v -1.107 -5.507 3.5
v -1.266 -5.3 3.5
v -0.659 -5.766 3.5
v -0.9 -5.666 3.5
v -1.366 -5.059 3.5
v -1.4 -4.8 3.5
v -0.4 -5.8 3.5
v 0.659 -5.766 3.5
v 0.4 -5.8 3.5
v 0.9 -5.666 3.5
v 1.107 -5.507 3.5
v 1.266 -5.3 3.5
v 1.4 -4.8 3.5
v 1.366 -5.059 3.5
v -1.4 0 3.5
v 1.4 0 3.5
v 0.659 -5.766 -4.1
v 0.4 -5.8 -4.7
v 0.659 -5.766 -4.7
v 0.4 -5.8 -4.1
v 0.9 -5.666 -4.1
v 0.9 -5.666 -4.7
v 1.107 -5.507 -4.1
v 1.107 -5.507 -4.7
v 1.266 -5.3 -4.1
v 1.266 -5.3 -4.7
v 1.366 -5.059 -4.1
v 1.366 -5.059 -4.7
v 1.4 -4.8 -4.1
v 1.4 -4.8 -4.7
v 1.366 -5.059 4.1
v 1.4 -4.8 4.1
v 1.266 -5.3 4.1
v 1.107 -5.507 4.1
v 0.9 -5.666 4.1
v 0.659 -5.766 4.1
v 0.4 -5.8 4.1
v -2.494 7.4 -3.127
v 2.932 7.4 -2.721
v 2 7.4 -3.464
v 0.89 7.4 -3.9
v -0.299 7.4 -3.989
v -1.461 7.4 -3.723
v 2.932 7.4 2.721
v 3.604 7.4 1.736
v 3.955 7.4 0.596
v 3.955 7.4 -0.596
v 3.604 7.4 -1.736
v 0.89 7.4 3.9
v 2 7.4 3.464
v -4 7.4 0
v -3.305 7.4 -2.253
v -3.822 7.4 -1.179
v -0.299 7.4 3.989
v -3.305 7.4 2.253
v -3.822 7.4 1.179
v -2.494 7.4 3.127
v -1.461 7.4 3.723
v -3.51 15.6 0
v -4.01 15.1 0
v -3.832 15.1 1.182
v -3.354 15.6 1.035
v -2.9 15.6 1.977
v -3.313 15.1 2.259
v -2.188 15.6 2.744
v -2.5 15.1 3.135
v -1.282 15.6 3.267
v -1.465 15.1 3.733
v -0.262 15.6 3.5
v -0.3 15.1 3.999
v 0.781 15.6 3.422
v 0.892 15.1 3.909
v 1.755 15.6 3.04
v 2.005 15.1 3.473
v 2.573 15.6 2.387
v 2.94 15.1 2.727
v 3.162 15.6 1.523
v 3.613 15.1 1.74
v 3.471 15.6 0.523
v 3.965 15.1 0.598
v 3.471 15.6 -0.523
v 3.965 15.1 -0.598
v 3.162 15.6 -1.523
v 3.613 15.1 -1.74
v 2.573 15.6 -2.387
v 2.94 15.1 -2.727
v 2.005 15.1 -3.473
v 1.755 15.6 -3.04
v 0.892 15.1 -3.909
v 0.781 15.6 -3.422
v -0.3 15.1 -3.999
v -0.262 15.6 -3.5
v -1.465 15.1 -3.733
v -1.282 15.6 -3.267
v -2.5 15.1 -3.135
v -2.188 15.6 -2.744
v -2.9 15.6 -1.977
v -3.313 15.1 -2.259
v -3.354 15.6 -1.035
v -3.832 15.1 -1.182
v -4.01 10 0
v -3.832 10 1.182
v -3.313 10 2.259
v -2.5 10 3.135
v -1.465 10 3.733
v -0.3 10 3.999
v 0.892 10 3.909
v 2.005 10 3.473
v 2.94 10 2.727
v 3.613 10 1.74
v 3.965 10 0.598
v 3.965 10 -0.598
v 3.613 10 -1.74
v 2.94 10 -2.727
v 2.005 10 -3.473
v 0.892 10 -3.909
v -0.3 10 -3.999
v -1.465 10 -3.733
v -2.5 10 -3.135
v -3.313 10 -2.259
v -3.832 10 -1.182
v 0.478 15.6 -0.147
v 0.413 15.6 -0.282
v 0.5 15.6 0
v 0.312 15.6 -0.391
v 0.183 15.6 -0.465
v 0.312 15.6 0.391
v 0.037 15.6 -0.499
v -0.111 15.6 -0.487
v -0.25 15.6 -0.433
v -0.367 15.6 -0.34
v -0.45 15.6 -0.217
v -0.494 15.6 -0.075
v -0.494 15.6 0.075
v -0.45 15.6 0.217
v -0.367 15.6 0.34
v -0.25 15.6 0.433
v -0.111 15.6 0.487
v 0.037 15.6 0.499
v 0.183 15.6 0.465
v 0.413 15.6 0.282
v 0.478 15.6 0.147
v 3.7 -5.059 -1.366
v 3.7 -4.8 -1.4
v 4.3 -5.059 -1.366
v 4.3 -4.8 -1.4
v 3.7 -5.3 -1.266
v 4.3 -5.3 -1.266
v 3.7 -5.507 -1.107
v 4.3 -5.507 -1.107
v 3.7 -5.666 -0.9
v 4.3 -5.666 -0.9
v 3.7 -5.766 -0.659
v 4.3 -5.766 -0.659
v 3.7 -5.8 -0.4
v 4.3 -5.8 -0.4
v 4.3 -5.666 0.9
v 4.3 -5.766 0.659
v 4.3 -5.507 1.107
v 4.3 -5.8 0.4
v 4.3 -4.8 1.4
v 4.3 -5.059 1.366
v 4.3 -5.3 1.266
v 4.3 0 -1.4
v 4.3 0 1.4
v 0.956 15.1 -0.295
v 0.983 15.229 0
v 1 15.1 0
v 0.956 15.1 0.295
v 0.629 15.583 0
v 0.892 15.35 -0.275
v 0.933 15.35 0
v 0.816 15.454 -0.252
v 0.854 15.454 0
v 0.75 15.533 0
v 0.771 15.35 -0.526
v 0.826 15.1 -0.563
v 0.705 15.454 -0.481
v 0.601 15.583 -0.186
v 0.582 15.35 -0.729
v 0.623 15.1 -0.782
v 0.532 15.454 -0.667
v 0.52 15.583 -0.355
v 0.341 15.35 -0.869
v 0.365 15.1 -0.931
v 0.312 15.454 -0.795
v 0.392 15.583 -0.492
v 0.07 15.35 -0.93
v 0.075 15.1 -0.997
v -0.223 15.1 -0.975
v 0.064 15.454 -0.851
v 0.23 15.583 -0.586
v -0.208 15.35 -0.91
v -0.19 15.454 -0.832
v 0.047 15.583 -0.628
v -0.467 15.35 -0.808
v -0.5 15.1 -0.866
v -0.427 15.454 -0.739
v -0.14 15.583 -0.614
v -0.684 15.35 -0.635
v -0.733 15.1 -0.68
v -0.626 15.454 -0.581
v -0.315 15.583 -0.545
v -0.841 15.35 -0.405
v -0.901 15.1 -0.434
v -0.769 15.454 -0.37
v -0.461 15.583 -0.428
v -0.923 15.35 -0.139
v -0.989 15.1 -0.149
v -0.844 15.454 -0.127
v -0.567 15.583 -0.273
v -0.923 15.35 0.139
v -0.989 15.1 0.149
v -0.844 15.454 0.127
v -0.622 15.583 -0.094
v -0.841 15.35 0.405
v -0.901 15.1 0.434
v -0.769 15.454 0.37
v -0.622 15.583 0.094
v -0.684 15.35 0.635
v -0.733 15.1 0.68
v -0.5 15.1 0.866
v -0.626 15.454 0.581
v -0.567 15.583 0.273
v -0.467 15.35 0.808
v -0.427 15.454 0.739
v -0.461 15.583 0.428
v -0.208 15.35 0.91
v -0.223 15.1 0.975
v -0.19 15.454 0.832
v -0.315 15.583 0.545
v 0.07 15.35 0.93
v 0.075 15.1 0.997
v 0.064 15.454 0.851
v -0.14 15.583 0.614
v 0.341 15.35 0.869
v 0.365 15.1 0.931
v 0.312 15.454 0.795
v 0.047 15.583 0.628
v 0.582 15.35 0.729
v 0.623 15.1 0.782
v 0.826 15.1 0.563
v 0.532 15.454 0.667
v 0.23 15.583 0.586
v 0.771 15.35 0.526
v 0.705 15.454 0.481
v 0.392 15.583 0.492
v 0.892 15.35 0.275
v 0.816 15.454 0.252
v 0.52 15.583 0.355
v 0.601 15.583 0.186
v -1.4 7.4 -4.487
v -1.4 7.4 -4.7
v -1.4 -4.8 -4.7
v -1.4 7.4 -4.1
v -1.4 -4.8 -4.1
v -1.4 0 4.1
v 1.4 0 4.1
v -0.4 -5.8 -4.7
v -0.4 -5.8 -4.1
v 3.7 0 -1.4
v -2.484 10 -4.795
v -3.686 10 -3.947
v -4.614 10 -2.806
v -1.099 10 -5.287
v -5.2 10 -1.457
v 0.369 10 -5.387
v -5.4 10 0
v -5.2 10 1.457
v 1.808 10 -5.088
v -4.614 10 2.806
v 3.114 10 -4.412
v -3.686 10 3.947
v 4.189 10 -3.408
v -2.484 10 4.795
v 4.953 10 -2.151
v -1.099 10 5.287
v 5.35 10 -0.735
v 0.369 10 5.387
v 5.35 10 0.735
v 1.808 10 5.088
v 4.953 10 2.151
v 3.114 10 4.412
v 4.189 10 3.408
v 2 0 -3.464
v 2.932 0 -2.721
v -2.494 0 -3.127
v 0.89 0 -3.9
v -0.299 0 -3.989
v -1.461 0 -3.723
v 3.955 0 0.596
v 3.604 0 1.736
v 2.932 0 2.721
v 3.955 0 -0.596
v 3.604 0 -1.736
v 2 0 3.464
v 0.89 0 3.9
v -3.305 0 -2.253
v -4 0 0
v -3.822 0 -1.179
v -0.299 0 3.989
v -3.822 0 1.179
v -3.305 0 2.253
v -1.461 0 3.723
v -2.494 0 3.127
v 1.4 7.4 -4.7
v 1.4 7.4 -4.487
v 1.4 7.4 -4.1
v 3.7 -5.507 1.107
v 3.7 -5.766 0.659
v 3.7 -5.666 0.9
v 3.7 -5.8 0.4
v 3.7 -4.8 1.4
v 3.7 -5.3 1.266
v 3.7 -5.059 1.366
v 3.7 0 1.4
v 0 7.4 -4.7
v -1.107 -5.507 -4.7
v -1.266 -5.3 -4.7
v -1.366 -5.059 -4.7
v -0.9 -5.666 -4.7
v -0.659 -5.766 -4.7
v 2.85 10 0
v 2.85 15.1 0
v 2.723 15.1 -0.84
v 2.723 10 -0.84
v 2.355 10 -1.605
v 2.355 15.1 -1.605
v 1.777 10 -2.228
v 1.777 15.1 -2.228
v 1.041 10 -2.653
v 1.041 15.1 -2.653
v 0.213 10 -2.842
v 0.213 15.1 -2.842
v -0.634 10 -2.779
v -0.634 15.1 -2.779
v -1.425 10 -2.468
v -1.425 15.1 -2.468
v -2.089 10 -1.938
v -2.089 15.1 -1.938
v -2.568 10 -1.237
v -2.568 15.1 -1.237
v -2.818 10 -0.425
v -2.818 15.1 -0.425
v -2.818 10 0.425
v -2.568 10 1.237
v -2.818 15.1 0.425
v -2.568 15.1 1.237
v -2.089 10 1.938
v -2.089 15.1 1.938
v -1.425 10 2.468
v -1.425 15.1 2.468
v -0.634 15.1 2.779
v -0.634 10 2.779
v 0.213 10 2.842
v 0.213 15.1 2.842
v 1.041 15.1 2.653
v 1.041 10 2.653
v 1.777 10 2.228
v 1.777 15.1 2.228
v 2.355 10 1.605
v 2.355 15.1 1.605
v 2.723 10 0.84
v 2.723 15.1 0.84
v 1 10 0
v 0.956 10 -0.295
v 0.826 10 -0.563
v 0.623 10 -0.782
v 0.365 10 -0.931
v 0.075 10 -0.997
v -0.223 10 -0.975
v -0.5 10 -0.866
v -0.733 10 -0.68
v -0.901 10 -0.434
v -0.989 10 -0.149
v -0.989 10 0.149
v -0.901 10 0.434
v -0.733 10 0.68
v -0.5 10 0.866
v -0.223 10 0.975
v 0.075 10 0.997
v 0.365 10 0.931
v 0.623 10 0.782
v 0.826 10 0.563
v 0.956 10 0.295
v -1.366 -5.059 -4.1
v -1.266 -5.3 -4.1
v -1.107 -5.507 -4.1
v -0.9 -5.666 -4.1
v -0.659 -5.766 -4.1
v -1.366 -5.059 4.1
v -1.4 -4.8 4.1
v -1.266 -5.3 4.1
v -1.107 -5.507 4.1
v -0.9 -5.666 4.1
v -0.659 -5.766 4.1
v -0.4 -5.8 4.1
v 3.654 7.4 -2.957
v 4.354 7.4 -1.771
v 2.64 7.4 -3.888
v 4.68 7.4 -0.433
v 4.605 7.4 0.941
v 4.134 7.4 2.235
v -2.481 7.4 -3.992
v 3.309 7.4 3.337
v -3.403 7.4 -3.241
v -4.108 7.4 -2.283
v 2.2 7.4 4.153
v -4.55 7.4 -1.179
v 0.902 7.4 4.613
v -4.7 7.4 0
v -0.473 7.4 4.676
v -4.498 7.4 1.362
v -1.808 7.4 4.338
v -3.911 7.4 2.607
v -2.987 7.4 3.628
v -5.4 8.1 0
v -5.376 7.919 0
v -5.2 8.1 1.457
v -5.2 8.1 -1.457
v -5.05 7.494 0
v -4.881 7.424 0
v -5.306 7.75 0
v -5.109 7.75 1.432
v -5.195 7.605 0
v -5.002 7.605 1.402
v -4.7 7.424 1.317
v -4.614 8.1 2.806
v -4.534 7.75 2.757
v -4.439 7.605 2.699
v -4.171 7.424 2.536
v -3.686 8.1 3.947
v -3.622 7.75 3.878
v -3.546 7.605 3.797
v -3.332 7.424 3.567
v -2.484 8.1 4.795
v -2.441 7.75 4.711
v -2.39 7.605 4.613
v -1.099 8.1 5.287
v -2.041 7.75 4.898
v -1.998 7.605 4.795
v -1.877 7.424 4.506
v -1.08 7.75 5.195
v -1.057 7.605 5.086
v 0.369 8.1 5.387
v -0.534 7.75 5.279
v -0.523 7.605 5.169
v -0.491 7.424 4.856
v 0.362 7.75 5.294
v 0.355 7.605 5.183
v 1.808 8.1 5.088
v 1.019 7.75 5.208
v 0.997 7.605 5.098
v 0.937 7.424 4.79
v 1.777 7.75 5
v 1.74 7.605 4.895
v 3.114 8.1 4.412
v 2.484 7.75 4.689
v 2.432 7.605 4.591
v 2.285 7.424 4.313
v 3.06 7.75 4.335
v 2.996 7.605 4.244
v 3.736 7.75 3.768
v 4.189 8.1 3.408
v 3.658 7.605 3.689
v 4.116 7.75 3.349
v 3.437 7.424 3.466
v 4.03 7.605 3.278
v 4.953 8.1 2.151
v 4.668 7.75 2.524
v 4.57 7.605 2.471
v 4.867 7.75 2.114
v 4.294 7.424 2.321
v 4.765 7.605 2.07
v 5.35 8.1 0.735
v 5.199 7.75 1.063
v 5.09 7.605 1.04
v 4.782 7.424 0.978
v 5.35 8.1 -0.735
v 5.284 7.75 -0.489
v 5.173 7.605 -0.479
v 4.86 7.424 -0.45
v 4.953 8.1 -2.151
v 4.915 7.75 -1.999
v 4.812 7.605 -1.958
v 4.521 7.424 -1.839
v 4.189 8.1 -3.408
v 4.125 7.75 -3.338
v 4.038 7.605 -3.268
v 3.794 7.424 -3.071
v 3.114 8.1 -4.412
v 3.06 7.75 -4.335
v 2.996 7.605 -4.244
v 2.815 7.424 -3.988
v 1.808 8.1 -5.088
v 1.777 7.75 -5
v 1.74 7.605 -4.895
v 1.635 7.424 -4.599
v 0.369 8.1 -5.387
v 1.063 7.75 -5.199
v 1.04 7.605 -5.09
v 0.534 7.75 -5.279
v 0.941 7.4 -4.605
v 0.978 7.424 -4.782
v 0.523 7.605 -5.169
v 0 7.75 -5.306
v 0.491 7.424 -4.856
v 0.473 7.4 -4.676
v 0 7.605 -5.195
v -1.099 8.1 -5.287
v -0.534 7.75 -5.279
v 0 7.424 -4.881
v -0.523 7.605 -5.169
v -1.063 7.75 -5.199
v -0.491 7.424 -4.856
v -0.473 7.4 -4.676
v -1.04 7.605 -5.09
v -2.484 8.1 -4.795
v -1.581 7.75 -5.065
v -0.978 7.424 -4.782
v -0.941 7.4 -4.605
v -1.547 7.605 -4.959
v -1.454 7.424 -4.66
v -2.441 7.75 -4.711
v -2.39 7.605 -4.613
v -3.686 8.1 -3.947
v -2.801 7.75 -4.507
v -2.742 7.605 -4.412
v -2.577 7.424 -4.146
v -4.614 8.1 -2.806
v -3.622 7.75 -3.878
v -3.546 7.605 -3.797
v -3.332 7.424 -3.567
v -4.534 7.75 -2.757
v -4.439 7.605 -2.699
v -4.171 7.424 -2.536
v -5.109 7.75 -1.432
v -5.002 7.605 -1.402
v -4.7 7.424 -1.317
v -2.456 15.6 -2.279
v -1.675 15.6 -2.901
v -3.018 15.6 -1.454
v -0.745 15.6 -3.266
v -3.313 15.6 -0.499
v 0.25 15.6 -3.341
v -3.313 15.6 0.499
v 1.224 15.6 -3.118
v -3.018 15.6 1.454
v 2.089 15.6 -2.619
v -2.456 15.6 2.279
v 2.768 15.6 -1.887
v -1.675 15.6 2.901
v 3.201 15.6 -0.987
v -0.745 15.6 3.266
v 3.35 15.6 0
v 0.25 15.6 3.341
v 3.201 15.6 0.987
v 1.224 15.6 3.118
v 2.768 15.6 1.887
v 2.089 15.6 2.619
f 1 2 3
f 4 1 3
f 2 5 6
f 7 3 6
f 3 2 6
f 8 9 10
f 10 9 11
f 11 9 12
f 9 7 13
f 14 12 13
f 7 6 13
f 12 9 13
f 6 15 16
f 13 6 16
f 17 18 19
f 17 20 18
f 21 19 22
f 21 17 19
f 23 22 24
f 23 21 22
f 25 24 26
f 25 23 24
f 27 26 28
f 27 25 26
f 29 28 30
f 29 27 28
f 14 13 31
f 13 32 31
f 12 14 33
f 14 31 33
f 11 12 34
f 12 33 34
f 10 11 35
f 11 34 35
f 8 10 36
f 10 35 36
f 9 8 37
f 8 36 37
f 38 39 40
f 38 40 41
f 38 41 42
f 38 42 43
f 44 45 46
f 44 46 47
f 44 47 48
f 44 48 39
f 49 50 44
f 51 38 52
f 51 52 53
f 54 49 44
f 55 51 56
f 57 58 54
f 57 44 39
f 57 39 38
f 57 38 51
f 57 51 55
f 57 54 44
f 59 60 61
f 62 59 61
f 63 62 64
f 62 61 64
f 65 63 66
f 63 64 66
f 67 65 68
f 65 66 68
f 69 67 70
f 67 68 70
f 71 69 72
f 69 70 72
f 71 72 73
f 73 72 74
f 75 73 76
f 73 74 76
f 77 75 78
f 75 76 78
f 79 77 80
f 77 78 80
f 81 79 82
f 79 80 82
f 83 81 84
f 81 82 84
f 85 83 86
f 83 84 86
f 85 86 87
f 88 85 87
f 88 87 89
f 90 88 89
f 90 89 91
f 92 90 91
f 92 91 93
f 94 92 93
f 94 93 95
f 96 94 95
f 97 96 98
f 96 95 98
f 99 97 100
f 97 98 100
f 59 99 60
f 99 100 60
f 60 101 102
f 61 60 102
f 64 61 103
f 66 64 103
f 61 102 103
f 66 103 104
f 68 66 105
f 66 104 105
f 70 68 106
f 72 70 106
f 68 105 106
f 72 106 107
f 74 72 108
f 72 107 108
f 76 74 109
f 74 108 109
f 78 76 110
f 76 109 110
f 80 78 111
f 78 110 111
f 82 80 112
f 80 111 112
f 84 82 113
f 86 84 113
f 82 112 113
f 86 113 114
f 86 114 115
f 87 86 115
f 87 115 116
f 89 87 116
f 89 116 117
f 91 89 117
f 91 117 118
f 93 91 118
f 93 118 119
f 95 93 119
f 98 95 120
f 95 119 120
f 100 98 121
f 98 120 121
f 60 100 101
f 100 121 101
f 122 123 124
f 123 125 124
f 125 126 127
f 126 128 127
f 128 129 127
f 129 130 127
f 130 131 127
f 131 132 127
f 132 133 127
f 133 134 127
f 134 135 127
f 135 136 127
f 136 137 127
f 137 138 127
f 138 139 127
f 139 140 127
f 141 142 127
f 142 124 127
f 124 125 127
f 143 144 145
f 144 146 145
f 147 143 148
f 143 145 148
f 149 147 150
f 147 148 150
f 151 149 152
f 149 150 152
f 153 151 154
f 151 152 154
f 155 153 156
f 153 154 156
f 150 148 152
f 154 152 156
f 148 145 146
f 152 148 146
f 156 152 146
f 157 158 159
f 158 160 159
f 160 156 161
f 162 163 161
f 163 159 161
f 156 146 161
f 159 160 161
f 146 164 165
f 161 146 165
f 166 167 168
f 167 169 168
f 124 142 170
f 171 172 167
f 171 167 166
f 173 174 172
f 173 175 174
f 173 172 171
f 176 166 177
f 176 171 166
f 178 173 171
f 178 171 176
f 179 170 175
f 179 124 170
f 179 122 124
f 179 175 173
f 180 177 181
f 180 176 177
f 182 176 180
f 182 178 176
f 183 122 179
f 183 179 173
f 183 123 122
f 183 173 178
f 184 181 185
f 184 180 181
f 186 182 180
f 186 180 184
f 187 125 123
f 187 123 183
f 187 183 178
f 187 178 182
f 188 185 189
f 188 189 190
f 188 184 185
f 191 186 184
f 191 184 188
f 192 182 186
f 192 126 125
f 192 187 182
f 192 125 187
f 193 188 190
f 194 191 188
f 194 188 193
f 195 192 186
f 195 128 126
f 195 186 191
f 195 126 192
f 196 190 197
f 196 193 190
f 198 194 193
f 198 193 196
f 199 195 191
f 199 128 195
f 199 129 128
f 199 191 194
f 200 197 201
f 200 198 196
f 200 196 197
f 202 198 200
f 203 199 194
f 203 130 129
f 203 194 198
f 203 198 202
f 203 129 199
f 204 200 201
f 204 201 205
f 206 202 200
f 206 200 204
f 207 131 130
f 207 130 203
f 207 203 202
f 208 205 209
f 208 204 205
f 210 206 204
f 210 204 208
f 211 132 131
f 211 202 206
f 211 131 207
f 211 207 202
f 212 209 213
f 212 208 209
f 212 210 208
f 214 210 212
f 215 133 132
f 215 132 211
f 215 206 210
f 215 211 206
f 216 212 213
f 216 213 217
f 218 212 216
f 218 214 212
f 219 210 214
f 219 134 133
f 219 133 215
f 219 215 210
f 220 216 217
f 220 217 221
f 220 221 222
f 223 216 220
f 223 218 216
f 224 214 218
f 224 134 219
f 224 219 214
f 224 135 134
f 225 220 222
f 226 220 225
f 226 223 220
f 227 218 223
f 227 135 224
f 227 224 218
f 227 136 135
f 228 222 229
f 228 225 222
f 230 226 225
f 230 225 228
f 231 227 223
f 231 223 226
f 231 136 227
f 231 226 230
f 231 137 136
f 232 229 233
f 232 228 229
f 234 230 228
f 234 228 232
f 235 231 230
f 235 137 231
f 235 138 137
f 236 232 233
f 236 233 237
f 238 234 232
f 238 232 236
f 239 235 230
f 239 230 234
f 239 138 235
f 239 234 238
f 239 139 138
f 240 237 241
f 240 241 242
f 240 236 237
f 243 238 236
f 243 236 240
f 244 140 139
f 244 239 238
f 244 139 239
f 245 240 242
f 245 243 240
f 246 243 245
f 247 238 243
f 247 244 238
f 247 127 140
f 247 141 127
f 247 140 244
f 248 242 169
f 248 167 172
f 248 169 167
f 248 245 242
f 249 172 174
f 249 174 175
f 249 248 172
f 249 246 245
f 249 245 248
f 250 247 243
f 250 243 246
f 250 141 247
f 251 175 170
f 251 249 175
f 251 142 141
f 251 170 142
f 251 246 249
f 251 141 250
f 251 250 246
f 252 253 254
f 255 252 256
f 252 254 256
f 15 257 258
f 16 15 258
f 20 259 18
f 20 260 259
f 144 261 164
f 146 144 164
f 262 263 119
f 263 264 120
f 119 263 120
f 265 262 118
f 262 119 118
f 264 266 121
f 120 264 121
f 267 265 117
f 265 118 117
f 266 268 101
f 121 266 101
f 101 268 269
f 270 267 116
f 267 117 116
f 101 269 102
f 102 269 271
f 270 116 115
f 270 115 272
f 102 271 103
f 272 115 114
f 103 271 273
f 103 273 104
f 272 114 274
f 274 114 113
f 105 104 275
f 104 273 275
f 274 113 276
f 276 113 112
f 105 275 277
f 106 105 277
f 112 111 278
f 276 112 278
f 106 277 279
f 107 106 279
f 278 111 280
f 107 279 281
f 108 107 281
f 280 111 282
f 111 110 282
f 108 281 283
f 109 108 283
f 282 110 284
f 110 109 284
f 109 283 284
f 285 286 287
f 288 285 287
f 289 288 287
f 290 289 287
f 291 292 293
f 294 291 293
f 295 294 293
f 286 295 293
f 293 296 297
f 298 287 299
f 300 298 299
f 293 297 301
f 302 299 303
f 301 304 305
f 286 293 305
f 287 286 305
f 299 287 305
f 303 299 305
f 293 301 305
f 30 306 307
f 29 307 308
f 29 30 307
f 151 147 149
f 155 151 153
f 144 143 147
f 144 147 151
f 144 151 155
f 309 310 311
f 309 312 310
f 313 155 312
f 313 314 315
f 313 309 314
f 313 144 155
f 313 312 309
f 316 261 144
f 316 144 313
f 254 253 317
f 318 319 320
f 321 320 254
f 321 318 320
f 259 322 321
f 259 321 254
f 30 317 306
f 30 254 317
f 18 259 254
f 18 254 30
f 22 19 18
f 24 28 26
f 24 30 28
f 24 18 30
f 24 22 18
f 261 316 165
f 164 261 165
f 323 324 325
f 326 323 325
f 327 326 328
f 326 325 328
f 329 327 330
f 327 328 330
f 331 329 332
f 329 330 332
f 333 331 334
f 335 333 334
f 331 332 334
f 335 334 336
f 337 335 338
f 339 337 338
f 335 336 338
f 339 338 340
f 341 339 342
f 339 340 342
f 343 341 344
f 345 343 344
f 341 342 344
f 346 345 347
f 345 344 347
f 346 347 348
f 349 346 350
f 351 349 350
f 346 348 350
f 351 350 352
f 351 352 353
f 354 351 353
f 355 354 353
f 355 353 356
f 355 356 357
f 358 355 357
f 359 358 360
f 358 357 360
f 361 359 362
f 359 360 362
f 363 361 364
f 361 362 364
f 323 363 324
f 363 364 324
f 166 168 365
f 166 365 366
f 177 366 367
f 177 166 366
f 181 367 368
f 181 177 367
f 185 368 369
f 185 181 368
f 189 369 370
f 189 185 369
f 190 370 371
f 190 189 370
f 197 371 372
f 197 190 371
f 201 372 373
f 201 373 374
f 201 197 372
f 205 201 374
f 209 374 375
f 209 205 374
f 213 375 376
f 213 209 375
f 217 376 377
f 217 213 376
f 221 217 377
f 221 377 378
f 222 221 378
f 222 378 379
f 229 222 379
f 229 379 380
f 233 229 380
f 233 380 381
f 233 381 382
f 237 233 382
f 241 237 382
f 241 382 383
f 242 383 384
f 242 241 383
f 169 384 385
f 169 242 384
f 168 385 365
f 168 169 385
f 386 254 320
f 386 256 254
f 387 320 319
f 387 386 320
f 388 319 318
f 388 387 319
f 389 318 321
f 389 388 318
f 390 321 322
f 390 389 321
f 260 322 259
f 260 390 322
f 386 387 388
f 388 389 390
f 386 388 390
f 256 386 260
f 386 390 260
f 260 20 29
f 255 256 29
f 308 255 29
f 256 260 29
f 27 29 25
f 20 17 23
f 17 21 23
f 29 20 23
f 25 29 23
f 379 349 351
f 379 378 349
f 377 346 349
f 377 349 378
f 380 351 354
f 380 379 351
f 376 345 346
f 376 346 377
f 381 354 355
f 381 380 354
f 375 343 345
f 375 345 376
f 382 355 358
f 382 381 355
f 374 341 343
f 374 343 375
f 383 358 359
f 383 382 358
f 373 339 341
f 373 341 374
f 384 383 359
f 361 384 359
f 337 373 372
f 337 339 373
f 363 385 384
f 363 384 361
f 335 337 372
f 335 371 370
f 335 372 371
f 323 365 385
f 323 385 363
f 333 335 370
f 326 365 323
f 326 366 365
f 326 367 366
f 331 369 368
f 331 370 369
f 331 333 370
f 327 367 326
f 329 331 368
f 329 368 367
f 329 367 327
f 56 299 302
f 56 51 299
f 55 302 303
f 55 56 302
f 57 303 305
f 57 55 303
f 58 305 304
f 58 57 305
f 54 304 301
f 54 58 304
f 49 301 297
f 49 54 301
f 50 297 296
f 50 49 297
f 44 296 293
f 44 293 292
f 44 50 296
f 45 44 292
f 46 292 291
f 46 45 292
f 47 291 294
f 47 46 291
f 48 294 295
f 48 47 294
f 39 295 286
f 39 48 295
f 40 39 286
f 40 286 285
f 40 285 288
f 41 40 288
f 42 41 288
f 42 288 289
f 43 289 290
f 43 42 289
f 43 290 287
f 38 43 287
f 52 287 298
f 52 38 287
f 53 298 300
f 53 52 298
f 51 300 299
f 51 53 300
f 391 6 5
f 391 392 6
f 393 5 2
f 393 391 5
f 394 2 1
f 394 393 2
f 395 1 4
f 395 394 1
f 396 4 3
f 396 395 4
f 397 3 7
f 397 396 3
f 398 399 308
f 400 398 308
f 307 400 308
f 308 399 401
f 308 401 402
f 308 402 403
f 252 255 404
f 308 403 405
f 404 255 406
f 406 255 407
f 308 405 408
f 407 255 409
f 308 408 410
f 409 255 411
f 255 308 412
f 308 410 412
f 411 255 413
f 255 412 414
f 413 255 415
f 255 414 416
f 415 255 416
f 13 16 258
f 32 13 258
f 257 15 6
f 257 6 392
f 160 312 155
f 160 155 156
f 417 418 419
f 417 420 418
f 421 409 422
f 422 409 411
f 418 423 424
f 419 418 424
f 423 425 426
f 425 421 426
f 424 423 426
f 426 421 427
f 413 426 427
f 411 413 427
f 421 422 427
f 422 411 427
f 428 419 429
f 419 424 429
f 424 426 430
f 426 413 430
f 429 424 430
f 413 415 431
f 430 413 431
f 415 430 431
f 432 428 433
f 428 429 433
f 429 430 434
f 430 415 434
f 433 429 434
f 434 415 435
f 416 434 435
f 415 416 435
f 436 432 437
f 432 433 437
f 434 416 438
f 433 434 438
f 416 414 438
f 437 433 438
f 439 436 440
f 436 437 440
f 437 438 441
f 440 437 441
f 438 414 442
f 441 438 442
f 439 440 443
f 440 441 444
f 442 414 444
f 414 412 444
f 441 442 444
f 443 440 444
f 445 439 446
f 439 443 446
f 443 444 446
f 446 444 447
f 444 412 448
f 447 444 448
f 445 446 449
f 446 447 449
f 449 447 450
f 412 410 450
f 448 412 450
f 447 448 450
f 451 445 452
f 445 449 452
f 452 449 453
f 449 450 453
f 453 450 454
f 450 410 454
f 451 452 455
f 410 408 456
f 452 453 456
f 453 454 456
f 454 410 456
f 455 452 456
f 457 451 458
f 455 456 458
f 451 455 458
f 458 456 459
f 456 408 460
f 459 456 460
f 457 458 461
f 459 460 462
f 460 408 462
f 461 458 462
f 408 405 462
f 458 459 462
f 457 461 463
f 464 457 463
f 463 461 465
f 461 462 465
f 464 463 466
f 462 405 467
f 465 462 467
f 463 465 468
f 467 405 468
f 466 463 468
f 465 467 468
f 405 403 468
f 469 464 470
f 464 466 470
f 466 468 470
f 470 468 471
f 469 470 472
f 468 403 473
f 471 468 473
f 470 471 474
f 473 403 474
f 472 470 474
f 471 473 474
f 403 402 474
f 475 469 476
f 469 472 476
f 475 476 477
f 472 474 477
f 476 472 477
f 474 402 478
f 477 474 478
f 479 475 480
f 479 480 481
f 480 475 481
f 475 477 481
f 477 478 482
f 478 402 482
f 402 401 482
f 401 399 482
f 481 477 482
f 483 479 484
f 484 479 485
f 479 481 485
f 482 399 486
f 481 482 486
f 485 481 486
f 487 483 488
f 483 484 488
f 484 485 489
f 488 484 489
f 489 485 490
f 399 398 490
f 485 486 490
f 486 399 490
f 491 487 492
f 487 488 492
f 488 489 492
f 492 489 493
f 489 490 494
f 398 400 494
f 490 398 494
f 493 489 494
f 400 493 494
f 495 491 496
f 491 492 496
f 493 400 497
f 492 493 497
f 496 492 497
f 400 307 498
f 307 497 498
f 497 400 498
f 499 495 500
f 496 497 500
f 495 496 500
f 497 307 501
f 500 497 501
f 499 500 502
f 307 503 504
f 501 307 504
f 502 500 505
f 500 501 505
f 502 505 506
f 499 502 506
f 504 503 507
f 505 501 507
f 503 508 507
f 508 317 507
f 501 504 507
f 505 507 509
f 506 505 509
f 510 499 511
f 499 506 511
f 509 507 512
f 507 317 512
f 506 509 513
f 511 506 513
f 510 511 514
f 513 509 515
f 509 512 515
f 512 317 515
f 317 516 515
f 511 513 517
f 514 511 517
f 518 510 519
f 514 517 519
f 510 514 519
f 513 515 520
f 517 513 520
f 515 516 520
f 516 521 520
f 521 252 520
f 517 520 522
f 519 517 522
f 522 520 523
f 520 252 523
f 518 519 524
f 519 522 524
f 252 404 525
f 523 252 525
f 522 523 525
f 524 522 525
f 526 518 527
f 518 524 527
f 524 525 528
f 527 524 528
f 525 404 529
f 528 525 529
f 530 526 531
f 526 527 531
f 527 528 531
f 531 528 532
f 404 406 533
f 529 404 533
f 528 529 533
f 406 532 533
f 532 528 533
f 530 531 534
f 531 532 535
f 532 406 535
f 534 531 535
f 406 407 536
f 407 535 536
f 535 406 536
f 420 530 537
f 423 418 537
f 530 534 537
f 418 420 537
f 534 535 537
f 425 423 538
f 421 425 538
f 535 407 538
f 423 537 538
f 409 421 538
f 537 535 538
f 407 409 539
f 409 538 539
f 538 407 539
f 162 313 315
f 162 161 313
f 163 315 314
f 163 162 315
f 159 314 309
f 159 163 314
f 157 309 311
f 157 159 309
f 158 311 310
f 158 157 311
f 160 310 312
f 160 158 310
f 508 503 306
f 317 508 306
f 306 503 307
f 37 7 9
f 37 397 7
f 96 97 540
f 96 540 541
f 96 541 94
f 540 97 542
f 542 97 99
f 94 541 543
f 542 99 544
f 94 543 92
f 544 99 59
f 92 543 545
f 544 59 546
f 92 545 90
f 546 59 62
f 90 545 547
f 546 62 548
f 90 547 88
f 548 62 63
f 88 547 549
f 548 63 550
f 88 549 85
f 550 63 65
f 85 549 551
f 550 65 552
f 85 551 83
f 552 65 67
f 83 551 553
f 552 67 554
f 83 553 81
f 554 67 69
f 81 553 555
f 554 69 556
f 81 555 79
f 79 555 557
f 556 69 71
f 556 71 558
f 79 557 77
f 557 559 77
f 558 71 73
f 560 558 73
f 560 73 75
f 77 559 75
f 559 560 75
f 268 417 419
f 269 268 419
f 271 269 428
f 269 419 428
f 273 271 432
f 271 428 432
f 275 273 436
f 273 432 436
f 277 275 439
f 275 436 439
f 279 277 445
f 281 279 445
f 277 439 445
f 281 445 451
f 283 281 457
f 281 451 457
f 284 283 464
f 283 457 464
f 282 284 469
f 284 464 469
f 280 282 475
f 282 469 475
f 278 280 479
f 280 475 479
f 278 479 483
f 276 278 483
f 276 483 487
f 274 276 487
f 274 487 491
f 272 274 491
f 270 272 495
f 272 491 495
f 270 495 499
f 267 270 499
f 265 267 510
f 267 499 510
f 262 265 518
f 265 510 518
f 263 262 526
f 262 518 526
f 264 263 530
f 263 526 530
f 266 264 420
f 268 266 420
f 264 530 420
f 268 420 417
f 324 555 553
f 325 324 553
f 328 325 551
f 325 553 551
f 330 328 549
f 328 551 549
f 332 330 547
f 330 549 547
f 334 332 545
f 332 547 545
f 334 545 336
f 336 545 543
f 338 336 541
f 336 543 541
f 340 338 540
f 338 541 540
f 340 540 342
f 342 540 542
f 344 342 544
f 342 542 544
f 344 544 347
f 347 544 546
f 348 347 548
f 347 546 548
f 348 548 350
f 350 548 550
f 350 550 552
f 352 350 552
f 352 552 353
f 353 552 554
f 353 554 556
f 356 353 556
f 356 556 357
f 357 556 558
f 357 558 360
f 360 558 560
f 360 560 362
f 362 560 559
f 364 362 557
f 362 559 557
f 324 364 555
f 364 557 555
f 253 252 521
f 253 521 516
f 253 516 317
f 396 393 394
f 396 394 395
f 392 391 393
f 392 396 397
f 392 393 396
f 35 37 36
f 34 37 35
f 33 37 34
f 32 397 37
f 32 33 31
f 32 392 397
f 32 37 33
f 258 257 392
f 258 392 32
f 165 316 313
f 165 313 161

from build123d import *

# Parameters (mm, degrees)
FILLET1_R             = 0.7
SKETCH1_3_W           = 4
SKETCH1_3_H           = 7.4
SKETCH2_R             = 2.85
SKETCH2_R_2           = 1
CUT_EXTRUDE1_DEPTH    = 5.6
FILLET2_R             = 0.5
CHAMFER1_SIZE         = 0.5
SKETCH15_W            = 2.8
SKETCH15_H            = 0.6
BOSS_EXTRUDE1_DEPTH   = 5.8
BOSS_EXTRUDE1_2_DEPTH = 5.8
SKETCH15_W_2          = 0.6
SKETCH15_H_2          = 2.8
BOSS_EXTRUDE1_3_DEPTH = 5.8
SKETCH15_2_W          = 2.8
SKETCH15_2_H          = 0.6
BOSS_EXTRUDE2_DEPTH   = 7.4
FILLET3_R             = 1
FILLET4_R             = 1
FILLET5_R             = 1


with BuildPart() as part:
    # Sketch1 → Revolve1 (revolve)
    with BuildSketch(Plane.XY):
        Polygon((-4, 7.4), (0, 7.4), (0, 15.6), (-4.01, 15.6), (-4.01, 10), (-5.4, 10), (-5.4, 7.4), align=None)
    revolve(axis=Axis((0, 0, 0), (0, 1, 0)))

    # Fillet1
    fillet1_edges = [part.edges().sort_by_distance(p)[0] for p in [
        (5.4, 7.4, 0),
    ]]
    fillet(fillet1_edges, radius=FILLET1_R)

    # Sketch2 → Cut-Extrude1 (cut)
    with BuildSketch(Plane(origin=(0, 15.6, 0), x_dir=(1, 0, 0), z_dir=(0, 1, 0))):
        Circle(SKETCH2_R)
        Circle(SKETCH2_R_2, mode=Mode.SUBTRACT)
    extrude(amount=-CUT_EXTRUDE1_DEPTH, mode=Mode.SUBTRACT)

    # Fillet2
    fillet2_edges = [part.edges().sort_by_distance(p)[0] for p in [
        (-1, 15.6, 0),
    ]]
    fillet(fillet2_edges, radius=FILLET2_R)

    # Chamfer1
    chamfer1_edges = [part.edges().sort_by_distance(p)[0] for p in [
        (-2.85, 15.6, 0),
        (4.01, 15.6, 0),
    ]]
    chamfer(chamfer1_edges, length=CHAMFER1_SIZE)



with BuildPart() as body_2:
    # Sketch1<3> → Revolve2 (revolve)
    with BuildSketch(Plane.XY):
        with Locations((-2, 3.7)):
            Rectangle(SKETCH1_3_W, SKETCH1_3_H)
    revolve(axis=Axis((0, 0, 0), (0, 1, 0)))


with BuildPart() as body_3:
    # Sketch15 → Boss-Extrude1 (new body)
    with BuildSketch(Plane.XZ):
        with Locations((0, 3.8)):
            Rectangle(SKETCH15_W, SKETCH15_H)
    extrude(amount=BOSS_EXTRUDE1_DEPTH)

    # Fillet3
    fillet3_edges = [body_3.edges().sort_by_distance(p)[0] for p in [
        (-1.4, -5.8, 3.8),
        (1.4, -5.8, 3.8),
    ]]
    fillet(fillet3_edges, radius=FILLET3_R)


with BuildPart() as body_4:
    # Sketch15 → Boss-Extrude1 2 (new body)
    with BuildSketch(Plane.XZ):
        with Locations((0, -4.4)):
            Rectangle(SKETCH15_W, SKETCH15_H)
    extrude(amount=BOSS_EXTRUDE1_2_DEPTH)


with BuildPart() as body_5:
    # Sketch15 → Boss-Extrude1 3 (new body)
    with BuildSketch(Plane.XZ):
        with Locations((4, 0)):
            Rectangle(SKETCH15_W_2, SKETCH15_H_2)
    extrude(amount=BOSS_EXTRUDE1_3_DEPTH)

    # Fillet5
    fillet5_edges = [body_5.edges().sort_by_distance(p)[0] for p in [
        (4, -5.8, -1.4),
        (4, -5.8, 1.4),
    ]]
    fillet(fillet5_edges, radius=FILLET5_R)


with BuildPart() as part_1:
    add(part.part)

    add(body_4.part)  # Boss-Extrude2 merges body 4
    # Sketch15<2> → Boss-Extrude2 (add)
    with BuildSketch(Plane.XZ):
        with Locations((0, -4.4)):
            Rectangle(SKETCH15_2_W, SKETCH15_2_H)
    extrude(amount=-BOSS_EXTRUDE2_DEPTH)

    # Fillet4
    fillet4_edges = [part_1.edges().sort_by_distance(p)[0] for p in [
        (1.4, -5.8, -4.4),
        (-1.4, -5.8, -4.4),
    ]]
    fillet(fillet4_edges, radius=FILLET4_R)


solid = Compound([body_2.part, body_3.part, body_5.part, part_1.part])
